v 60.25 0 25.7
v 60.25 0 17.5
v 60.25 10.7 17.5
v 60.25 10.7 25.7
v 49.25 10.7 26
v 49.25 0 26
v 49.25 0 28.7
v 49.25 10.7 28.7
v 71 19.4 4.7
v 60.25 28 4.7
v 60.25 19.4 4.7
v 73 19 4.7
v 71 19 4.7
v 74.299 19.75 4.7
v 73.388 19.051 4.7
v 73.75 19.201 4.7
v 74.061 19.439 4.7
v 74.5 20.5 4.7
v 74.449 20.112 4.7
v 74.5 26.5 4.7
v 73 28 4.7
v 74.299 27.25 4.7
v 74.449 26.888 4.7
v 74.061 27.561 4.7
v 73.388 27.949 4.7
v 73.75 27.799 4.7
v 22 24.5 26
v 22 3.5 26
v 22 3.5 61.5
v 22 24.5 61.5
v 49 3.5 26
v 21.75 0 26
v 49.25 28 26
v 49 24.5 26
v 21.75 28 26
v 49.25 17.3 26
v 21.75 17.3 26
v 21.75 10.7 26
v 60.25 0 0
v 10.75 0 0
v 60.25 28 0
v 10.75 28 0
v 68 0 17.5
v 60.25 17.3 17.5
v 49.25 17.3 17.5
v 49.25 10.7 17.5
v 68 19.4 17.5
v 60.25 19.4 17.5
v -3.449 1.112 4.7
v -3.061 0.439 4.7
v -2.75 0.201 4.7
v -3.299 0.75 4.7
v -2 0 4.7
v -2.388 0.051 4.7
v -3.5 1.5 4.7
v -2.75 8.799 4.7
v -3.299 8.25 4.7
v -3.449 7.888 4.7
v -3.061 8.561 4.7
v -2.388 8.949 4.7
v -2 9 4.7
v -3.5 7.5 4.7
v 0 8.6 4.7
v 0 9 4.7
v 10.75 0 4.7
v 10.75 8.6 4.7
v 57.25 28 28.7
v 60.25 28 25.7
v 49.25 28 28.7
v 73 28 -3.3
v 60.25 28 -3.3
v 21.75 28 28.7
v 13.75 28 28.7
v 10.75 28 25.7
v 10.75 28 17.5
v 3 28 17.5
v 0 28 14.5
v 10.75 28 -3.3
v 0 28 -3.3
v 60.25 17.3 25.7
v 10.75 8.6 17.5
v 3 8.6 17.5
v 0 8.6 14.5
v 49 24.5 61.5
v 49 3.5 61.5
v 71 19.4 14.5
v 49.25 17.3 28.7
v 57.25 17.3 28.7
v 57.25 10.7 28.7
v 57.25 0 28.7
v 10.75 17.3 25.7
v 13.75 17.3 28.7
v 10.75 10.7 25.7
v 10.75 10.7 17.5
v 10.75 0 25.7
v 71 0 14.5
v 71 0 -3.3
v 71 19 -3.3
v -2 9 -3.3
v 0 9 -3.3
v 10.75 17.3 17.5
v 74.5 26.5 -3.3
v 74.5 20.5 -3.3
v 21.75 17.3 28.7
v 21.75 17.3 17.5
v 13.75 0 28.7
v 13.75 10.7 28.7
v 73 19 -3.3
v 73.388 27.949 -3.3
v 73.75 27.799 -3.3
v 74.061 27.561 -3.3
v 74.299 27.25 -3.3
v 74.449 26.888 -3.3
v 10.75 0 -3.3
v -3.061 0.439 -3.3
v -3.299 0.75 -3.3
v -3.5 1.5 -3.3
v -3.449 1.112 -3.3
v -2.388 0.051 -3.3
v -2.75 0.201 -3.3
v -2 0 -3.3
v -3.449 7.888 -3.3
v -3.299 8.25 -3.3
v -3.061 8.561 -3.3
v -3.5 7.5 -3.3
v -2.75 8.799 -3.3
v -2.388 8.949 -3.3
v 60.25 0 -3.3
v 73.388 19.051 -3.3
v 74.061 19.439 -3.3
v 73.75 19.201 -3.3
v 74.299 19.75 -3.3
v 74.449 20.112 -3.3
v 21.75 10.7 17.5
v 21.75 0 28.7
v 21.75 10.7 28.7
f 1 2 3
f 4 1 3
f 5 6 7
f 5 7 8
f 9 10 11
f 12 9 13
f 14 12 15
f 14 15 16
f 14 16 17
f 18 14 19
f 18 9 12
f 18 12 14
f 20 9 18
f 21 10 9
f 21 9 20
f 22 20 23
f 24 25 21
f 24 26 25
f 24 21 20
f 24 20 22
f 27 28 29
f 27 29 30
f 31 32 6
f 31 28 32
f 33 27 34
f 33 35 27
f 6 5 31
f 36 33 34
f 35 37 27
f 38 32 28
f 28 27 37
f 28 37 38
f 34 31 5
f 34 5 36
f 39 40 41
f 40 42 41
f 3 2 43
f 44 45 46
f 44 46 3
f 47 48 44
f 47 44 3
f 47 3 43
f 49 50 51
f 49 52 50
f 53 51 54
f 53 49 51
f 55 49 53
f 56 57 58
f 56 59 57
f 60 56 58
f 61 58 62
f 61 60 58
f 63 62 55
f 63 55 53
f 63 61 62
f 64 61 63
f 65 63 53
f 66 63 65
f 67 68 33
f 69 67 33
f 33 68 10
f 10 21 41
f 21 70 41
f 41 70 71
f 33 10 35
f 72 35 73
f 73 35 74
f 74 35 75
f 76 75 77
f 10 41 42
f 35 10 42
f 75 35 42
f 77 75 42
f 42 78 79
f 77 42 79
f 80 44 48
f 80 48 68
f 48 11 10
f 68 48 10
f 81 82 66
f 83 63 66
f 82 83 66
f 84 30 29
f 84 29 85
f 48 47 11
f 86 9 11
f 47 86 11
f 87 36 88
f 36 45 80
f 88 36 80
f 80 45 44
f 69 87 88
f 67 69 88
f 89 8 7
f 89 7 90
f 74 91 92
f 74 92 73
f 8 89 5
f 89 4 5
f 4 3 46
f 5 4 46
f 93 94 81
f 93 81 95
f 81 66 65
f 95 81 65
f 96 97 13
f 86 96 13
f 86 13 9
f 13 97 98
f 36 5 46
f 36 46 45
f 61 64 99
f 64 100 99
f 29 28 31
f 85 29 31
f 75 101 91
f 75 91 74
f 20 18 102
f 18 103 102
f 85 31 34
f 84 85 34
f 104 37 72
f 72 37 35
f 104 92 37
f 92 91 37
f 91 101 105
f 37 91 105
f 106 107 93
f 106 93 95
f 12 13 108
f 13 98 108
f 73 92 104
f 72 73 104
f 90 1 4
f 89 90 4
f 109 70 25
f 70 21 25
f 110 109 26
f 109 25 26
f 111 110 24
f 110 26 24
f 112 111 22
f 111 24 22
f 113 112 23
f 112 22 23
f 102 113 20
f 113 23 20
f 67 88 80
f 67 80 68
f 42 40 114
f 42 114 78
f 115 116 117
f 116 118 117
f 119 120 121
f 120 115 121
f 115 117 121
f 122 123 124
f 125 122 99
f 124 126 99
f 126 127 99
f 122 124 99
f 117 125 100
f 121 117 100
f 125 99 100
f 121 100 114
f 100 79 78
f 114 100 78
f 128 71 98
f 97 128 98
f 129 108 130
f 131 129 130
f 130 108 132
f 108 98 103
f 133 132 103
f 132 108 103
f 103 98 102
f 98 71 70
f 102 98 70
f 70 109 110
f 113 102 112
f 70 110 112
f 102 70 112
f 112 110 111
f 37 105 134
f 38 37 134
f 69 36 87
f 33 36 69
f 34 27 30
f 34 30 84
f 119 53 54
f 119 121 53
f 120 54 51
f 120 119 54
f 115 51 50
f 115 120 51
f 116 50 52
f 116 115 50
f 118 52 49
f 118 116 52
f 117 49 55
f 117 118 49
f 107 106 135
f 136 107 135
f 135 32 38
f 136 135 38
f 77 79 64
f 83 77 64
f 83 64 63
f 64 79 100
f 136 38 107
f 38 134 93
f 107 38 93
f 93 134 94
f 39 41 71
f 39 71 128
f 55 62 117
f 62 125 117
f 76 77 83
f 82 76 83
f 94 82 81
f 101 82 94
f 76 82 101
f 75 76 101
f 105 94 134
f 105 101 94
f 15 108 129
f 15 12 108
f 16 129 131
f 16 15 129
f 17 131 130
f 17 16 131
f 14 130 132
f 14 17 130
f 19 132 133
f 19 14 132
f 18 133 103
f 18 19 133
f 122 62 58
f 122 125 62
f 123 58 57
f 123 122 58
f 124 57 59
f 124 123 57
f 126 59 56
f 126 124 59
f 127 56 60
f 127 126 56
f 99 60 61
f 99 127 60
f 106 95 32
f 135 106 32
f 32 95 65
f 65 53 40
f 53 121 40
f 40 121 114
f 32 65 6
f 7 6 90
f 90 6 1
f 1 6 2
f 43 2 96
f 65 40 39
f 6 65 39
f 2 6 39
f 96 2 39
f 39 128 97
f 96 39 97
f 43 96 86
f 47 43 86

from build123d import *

# Parameters (mm, degrees)
F0_W     = 10.75
F0_H     = 8.6
F1_DEPTH = 3.3
F0_W_2   = 27
F0_H_2   = 21
F0_W_3   = 7.25
F0_H_3   = 10.7
F0_H_4   = 6.6
F0_W_4   = 3.75
F2_DEPTH = 4.7
F3_DEPTH = 17.5
F4_DEPTH = 28.7
F5_DEPTH = 26
F6_DEPTH = 61.5
F7_SIZE  = 3
F8_R     = 1.5


with BuildPart() as f1:
    # F0 (on Top) → F1 (new body)
    with BuildSketch(Plane.XY):
        Polygon((-3.5, 0), (0, 0), (0, 8.6), (0, 9), (-3.5, 9), align=None)
        with Locations((5.375, 4.3)):
            Rectangle(F0_W, F0_H)
        Polygon((0, 9), (0, 8.6), (10.75, 8.6), (10.75, 10.7), (10.75, 17.3), (10.75, 28), (0, 28), (0, 19), align=None)
    extrude(amount=-F1_DEPTH)



with BuildPart() as f1b:
    # F0 (on Top) → F1, piece 2 (new body)
    with BuildSketch(Plane.XY):
        Polygon((71, 19.4), (71, 19), (74.5, 19), (74.5, 28), (71, 28), align=None)
        with Locations((65.625, 23.7)):
            Rectangle(F0_W, F0_H)
        Polygon((60.25, 10.7), (60.25, 0), (71, 0), (71, 9), (71, 19), (71, 19.4), (60.25, 19.4), (60.25, 17.3), align=None)
    extrude(amount=-F1_DEPTH)


with BuildPart() as f1_1:
    add(f1.part)

    add(f1b.part)  # F2 merges F1b
    # F0 (on Top) → F2 (join)
    with BuildSketch(Plane.XY):
        Polygon((21.75, 10.7), (21.75, 0), (49.25, 0), (49.25, 10.7), (49.25, 17.3), (49.25, 28), (21.75, 28), (21.75, 17.3), align=None)
        with Locations((35.5, 14)):
            Rectangle(F0_W_2, F0_H_2, mode=Mode.SUBTRACT)
        with Locations((35.5, 14)):
            Rectangle(F0_W_2, F0_H_2)
        Polygon((0, 9), (0, 8.6), (10.75, 8.6), (10.75, 10.7), (10.75, 17.3), (10.75, 28), (0, 28), (0, 19), align=None)
        Polygon((60.25, 10.7), (60.25, 0), (71, 0), (71, 9), (71, 19), (71, 19.4), (60.25, 19.4), (60.25, 17.3), align=None)
        with Locations((65.625, 23.7)):
            Rectangle(F0_W, F0_H)
        with Locations((5.375, 4.3)):
            Rectangle(F0_W, F0_H)
        with Locations((56.625, 5.35)):
            Rectangle(F0_W_3, F0_H_3)
        Polygon((53, 28), (53, 17.3), (60.25, 17.3), (60.25, 19.4), (60.25, 28), align=None)
        Polygon((10.75, 8.6), (10.75, 0), (18, 0), (18, 10.7), (10.75, 10.7), align=None)
        with Locations((14.375, 22.65)):
            Rectangle(F0_W_3, F0_H_3)
        with Locations((14.375, 14)):
            Rectangle(F0_W_3, F0_H_4)
        with Locations((56.625, 14)):
            Rectangle(F0_W_3, F0_H_4)
        with Locations((51.125, 5.35)):
            Rectangle(F0_W_4, F0_H_3)
        with Locations((19.875, 5.35)):
            Rectangle(F0_W_4, F0_H_3)
        with Locations((51.125, 22.65)):
            Rectangle(F0_W_4, F0_H_3)
        with Locations((19.875, 22.65)):
            Rectangle(F0_W_4, F0_H_3)
        Polygon((71, 19.4), (71, 19), (74.5, 19), (74.5, 28), (71, 28), align=None)
        Polygon((-3.5, 0), (0, 0), (0, 8.6), (0, 9), (-3.5, 9), align=None)
        with Locations((19.875, 14)):
            Rectangle(F0_W_4, F0_H_4)
        with Locations((51.125, 14)):
            Rectangle(F0_W_4, F0_H_4)
    extrude(amount=F2_DEPTH)

    # F0 (on Top) → F3 (join)
    with BuildSketch(Plane.XY):
        Polygon((0, 9), (0, 8.6), (10.75, 8.6), (10.75, 10.7), (10.75, 17.3), (10.75, 28), (0, 28), (0, 19), align=None)
        Polygon((60.25, 10.7), (60.25, 0), (71, 0), (71, 9), (71, 19), (71, 19.4), (60.25, 19.4), (60.25, 17.3), align=None)
        with Locations((14.375, 14)):
            Rectangle(F0_W_3, F0_H_4)
        with Locations((19.875, 14)):
            Rectangle(F0_W_4, F0_H_4)
        with Locations((51.125, 14)):
            Rectangle(F0_W_4, F0_H_4)
        with Locations((56.625, 14)):
            Rectangle(F0_W_3, F0_H_4)
    extrude(amount=F3_DEPTH)

    # F0 (on Top) → F4 (join)
    with BuildSketch(Plane.XY):
        with Locations((14.375, 22.65)):
            Rectangle(F0_W_3, F0_H_3)
        Polygon((10.75, 8.6), (10.75, 0), (18, 0), (18, 10.7), (10.75, 10.7), align=None)
        with Locations((19.875, 5.35)):
            Rectangle(F0_W_4, F0_H_3)
        with Locations((19.875, 22.65)):
            Rectangle(F0_W_4, F0_H_3)
        with Locations((51.125, 22.65)):
            Rectangle(F0_W_4, F0_H_3)
        Polygon((53, 28), (53, 17.3), (60.25, 17.3), (60.25, 19.4), (60.25, 28), align=None)
        with Locations((56.625, 5.35)):
            Rectangle(F0_W_3, F0_H_3)
        with Locations((51.125, 5.35)):
            Rectangle(F0_W_4, F0_H_3)
    extrude(amount=F4_DEPTH)

    # F0 (on Top) → F5 (join)
    with BuildSketch(Plane.XY):
        Polygon((21.75, 10.7), (21.75, 0), (49.25, 0), (49.25, 10.7), (49.25, 17.3), (49.25, 28), (21.75, 28), (21.75, 17.3), align=None)
        with Locations((35.5, 14)):
            Rectangle(F0_W_2, F0_H_2, mode=Mode.SUBTRACT)
    extrude(amount=F5_DEPTH)

    # F0 (on Top) → F6 (join)
    with BuildSketch(Plane.XY):
        with Locations((35.5, 14)):
            Rectangle(F0_W_2, F0_H_2)
    extrude(amount=F6_DEPTH)

    # F7
    f7_edges = [f1_1.edges().sort_by_distance(p)[0] for p in [
        (10.75, 22.65, 28.7),
        (10.75, 5.35, 28.7),
        (60.25, 5.35, 28.7),
        (60.25, 22.65, 28.7),
        (0, 18.3, 17.5),
        (71, 9.7, 17.5),
    ]]
    chamfer(f7_edges, length=F7_SIZE)

    # F8
    f8_edges = [f1_1.edges().sort_by_distance(p)[0] for p in [
        (-3.5, 0, 0.7),
        (74.5, 28, 0.7),
        (74.5, 19, 0.7),
        (-3.5, 9, 0.7),
    ]]
    fillet(f8_edges, radius=F8_R)


solid = f1_1.part
